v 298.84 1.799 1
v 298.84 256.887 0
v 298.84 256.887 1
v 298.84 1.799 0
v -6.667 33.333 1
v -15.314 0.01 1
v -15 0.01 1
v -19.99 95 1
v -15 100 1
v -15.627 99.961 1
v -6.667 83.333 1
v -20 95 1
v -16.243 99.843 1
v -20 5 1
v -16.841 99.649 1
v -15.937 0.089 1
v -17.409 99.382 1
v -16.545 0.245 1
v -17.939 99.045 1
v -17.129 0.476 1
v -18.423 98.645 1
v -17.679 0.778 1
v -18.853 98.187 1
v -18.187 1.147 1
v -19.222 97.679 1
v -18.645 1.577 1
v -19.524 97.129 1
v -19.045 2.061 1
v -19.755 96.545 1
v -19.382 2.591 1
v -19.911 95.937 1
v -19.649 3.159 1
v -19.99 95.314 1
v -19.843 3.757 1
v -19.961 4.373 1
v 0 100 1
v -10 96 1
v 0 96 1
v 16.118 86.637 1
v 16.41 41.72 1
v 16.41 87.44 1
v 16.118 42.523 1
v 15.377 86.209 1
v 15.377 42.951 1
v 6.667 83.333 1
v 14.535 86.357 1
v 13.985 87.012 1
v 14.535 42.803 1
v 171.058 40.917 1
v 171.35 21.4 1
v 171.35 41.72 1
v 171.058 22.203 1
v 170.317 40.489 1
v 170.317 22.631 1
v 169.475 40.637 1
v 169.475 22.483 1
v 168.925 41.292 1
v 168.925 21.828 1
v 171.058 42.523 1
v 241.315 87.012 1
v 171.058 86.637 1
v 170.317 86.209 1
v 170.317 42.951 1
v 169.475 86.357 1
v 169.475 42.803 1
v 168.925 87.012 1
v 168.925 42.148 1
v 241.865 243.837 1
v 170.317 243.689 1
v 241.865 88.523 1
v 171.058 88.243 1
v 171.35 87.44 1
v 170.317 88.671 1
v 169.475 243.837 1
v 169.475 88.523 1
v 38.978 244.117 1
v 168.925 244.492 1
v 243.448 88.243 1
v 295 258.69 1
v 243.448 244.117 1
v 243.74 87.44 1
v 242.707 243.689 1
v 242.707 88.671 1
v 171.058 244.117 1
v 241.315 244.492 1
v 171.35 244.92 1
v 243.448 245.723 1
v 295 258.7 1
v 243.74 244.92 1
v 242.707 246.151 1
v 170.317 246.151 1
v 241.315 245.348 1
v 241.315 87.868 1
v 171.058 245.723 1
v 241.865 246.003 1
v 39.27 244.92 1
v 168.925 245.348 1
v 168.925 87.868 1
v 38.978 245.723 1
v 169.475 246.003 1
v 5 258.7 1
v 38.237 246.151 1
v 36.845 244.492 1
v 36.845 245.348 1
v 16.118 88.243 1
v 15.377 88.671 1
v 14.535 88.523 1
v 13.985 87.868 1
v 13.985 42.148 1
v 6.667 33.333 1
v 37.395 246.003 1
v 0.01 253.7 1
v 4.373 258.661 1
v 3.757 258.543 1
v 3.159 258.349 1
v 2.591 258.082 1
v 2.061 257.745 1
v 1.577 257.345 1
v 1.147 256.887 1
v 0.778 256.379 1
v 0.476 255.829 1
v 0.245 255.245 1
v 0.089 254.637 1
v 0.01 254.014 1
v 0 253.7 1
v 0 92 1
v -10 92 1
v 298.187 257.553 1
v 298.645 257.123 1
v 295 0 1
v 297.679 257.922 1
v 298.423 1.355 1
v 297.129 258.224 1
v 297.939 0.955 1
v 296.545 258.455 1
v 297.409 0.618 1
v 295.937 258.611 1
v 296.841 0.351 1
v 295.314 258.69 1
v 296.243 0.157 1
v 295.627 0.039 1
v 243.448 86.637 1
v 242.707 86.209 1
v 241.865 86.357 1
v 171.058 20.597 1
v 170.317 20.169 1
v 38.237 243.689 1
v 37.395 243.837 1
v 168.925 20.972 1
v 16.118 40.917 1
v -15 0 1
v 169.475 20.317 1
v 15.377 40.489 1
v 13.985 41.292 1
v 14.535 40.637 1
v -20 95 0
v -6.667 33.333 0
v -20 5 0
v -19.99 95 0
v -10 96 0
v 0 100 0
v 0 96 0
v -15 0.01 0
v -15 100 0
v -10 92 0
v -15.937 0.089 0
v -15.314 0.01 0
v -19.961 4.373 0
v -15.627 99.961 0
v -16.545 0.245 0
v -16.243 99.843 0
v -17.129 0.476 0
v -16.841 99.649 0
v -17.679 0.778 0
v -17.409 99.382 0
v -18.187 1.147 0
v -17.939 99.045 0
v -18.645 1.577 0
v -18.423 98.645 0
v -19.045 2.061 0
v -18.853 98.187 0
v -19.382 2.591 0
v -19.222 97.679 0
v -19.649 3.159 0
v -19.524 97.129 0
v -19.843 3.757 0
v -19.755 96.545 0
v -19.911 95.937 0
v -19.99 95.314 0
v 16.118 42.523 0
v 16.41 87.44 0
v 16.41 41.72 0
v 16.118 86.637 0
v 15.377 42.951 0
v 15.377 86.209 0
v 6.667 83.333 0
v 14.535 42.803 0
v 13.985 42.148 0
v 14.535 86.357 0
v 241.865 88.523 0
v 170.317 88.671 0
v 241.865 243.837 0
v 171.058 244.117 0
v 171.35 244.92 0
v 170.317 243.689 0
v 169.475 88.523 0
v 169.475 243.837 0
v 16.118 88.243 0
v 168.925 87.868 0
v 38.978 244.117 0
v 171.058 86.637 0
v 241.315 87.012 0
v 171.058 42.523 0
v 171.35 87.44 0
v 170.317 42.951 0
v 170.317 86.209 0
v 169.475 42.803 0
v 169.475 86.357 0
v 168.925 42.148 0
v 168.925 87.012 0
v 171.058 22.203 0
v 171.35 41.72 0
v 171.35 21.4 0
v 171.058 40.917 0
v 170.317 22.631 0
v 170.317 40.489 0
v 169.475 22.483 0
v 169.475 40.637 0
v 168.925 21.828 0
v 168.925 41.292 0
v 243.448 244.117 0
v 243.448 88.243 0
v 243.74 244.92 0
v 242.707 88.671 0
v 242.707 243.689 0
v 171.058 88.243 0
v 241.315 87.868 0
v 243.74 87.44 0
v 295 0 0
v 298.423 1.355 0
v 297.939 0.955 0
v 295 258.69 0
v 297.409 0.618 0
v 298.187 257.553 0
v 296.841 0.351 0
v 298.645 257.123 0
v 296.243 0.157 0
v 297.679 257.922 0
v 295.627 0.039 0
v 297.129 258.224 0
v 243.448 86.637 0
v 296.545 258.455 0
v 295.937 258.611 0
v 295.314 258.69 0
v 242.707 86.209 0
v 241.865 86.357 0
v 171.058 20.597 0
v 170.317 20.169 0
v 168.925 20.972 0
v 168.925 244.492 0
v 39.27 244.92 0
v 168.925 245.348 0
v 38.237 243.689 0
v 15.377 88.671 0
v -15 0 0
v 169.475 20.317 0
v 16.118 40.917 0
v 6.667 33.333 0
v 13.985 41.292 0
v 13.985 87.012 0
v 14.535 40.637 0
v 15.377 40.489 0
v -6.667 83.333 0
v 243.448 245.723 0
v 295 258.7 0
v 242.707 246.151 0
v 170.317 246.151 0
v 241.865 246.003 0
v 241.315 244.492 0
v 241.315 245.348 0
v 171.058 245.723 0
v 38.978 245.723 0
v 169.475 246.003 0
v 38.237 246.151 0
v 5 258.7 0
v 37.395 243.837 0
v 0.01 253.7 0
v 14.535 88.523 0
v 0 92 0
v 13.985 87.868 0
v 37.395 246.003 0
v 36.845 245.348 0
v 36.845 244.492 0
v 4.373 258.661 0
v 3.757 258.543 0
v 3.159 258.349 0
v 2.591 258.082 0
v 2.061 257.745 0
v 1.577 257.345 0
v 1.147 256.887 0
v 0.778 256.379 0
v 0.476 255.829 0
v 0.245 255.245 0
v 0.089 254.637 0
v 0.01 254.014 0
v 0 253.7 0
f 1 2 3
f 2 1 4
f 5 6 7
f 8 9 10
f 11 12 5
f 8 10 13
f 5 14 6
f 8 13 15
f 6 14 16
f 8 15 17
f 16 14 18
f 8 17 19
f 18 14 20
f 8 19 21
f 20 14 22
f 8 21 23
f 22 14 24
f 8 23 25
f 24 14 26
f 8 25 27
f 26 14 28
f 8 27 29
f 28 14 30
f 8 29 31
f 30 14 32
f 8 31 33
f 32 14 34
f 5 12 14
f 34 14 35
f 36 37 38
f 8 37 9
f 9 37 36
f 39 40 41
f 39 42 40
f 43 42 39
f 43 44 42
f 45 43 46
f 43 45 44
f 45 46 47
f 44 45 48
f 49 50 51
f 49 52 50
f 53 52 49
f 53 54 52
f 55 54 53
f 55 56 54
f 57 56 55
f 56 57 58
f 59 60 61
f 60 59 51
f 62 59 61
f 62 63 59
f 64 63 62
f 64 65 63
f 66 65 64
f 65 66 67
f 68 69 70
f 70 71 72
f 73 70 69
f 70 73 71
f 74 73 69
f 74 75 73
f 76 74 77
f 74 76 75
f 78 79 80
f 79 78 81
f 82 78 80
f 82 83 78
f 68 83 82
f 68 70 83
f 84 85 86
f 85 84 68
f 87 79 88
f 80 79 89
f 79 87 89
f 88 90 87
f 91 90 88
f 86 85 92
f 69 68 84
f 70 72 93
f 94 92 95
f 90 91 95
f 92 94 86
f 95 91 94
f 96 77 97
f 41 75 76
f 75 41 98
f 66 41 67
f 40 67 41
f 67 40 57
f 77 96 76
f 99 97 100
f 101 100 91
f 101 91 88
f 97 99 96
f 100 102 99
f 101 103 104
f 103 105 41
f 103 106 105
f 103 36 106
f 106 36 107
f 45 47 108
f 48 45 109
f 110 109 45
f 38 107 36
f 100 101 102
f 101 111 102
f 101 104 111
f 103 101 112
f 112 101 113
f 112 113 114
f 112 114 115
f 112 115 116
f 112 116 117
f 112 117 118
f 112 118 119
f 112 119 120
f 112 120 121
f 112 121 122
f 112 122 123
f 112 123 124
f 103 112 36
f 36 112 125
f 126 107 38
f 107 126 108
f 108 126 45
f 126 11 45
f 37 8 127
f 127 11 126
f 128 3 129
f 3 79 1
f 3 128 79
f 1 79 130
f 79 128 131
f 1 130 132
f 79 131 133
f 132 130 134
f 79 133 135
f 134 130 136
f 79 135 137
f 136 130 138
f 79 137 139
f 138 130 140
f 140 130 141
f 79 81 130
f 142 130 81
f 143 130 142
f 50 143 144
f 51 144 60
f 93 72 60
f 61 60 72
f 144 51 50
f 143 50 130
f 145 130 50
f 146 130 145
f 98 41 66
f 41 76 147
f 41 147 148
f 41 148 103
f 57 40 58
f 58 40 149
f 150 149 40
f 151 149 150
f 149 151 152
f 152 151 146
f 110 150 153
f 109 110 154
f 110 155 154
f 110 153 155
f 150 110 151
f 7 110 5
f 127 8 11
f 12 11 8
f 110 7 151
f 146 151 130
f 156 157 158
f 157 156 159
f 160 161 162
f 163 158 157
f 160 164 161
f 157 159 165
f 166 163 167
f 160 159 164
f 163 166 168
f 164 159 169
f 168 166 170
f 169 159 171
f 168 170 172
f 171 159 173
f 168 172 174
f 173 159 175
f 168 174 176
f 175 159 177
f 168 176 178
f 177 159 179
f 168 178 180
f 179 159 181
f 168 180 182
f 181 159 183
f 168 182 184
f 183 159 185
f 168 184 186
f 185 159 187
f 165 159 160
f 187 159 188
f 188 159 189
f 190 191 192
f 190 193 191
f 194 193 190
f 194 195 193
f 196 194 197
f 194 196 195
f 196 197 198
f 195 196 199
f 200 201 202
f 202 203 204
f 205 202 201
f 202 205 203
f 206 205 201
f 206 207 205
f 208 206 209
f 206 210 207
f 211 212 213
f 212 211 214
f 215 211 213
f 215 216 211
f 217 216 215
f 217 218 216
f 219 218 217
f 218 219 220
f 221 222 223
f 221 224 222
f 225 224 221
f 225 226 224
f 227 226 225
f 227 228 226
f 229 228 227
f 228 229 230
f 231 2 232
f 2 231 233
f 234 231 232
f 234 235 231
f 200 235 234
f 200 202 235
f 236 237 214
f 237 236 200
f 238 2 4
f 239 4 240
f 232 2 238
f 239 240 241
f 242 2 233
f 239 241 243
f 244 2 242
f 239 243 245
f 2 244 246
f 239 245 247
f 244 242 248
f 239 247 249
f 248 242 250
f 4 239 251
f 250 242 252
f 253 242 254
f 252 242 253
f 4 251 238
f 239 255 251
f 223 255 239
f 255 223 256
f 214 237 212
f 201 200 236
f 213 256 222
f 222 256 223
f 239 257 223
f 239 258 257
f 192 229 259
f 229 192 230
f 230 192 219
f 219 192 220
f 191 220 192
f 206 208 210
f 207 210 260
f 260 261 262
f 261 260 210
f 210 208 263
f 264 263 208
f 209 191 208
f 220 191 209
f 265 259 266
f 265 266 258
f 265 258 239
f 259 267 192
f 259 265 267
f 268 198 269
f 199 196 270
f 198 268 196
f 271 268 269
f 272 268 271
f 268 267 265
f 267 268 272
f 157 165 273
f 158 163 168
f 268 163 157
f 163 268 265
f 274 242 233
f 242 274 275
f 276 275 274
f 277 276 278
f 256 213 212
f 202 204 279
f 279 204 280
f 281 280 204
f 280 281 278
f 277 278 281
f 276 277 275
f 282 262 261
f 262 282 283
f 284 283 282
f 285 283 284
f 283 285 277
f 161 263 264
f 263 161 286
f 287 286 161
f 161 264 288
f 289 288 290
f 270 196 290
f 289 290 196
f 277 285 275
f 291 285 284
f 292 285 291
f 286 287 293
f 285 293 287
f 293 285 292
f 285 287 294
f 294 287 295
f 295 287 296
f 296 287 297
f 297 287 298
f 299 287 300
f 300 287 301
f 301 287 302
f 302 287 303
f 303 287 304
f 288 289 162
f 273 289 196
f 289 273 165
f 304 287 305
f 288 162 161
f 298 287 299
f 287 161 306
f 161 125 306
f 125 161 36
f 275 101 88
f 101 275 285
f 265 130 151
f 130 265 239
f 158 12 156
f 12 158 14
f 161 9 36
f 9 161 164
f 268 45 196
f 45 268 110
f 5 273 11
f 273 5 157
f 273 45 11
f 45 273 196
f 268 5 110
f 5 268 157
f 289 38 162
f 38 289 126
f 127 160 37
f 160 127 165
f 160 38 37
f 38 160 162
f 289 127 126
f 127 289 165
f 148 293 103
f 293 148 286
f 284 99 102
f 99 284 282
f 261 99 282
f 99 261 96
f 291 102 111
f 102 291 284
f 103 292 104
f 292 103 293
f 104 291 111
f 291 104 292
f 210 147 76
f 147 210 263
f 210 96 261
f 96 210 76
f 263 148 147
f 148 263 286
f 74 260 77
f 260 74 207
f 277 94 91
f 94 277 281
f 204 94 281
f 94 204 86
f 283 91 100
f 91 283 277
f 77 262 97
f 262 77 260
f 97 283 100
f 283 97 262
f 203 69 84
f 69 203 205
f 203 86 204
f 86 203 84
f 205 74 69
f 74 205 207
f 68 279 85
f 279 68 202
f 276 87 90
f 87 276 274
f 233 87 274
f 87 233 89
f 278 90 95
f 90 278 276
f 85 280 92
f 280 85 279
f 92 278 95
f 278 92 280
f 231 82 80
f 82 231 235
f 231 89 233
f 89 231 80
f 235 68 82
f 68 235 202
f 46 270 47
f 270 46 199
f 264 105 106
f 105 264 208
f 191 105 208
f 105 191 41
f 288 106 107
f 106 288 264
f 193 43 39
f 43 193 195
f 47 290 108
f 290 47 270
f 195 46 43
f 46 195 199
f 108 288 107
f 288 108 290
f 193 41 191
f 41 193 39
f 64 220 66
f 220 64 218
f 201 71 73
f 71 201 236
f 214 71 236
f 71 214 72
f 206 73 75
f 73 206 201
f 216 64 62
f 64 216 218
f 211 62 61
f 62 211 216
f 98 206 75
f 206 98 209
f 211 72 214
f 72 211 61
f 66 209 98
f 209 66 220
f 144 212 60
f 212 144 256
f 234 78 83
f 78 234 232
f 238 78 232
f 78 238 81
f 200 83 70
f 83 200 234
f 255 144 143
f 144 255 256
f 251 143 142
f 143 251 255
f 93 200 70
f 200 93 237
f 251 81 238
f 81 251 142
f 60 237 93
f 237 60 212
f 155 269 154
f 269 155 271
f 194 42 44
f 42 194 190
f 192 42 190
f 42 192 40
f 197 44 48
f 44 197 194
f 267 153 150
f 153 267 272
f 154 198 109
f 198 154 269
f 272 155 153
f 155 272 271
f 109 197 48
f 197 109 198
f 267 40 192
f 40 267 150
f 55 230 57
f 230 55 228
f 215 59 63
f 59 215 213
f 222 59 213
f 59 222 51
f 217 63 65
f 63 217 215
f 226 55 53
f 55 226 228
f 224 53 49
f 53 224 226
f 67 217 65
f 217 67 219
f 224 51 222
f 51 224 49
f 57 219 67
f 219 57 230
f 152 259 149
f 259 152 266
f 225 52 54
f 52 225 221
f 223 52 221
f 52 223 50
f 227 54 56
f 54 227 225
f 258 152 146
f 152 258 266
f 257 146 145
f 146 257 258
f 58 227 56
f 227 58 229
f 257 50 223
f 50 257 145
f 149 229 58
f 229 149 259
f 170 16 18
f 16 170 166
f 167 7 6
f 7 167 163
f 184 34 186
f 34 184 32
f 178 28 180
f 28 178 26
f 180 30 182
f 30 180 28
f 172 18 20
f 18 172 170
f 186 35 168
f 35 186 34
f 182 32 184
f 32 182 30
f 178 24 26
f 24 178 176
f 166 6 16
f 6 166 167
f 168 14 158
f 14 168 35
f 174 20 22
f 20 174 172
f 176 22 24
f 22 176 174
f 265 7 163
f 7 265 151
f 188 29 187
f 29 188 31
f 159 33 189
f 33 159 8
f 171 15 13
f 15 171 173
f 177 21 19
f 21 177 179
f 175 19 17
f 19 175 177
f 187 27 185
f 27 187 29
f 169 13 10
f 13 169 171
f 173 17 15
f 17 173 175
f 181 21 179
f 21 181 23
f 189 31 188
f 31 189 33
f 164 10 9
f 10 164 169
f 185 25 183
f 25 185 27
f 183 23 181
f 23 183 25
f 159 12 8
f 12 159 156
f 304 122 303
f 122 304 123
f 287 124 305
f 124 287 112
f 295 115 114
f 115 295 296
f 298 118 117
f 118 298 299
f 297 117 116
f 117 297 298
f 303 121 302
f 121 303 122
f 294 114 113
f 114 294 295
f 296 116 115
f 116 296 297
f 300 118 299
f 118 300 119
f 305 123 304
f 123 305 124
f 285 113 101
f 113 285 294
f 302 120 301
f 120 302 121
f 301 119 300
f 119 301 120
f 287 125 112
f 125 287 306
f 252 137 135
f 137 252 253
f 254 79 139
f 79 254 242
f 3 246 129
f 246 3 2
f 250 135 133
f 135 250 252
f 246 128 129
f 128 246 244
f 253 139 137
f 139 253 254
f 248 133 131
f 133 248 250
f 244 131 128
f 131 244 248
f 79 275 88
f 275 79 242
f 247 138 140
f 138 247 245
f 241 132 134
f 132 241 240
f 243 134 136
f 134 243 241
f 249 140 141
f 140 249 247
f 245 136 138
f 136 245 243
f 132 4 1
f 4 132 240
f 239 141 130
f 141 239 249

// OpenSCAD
$fn = 9;
fn_corner = 50;

/*
   Rack
 */
r_unit 		= 44.45;
r_unit_nb	= 6;
r_spacer	= 4*2;	/* 2*4 mm spacer (up/down) */
r_d		= r_unit * r_unit_nb;
r_w		= 440;  /* Rack tray internal width */
r_depth		= 300;	/* Rack tray depth if it has a blocker */

/*
   Micro ATX
 */
b_w		= 243.84; /* x */
b_d		= 243.84; /* y */
b_h		= 45;     /* subjective height of the board - depends on fan/cards */
b_hole_dia 	= 2.5;

/*
   Flex PSU
 */
f_w		= 200;	  /* x */
f_d		= 81.5;	  /* y */
f_h		= 40.5;	  /* z */

/*
   Disk 2.5 3.5
   */
d_w1		= 200;	  /* x */
d_d1		= 101.6;  /* y */
d_w2		= 100;	  /* x */
d_d2		= 69.85;  /* y */

/*
   Plate
 */
p_d		= r_d - r_spacer;
p_front_b_decal	= 5;	/* 5 mm */
p_w		= p_front_b_decal + b_w + f_w + 50;	/* 5cm */
p_w_mb  = p_front_b_decal + b_w + 50;	/* 5cm */
p_thickness	= 1;
p_slot_w	= r_depth;
p_slot_d	= 10;
p_holder_w	= 20;
p_holder_d	= 100;
p_f_nb		= 5;  /* flex hole number */
p_d_nb		= 5;  /* disk hole number */
p_itemhole_w	= 10; /* flex/disk hole w */
p_itemhole_d	= 4;  /* flex/disk hole d */

/*
   Support
 */
s_h		= 7;	/* total 8mm */
s_thickness	= 1;	/* 2mm base thickness */
s_w		= r_depth/3;
s_d		= r_w / 3;


b_holes = [ /* top->bottom, left->right */
	[  33.02,	237.49 ],
	[ 165.10,	237.49 ],
	[ 237.49,	237.49 ],
	[  10.16,	 80.01 ],
	[ 165.10,        80.01 ],
	[ 237.49,	 80.01 ],
	[  10.16,	 34.29 ],
	[ 165.10,	 34.29 ],
	[ 165.10,	 13.97 ]
];

module board() {
	cube([b_w, b_d, b_h]);
}

module board_mask( spacer ) {
	board();
	for (h = b_holes)
	{
		translate([h[0],h[1],0])
			cylinder( r=b_hole_dia/2, h = spacer, center=true );
	}
}

module slot_mask(w, nb) {
	for (i = [0 : nb-1])
		translate([ w/(nb*2) + (w*i)/nb - p_itemhole_w/2, p_itemhole_d/-2,-p_thickness])
			cube([ p_itemhole_w, p_itemhole_d, p_thickness * 3 ]);
}
module psu_slots_mask() {
	slot_mask(f_w, p_f_nb);
	translate([0,f_d,0])
		slot_mask(f_w, p_f_nb);
}
module disk_slots_mask() {
	slot_mask(d_w1, p_d_nb);
	translate([0,d_d1,0])
		slot_mask(d_w1, p_d_nb);
	translate([0,d_d2,0])
		slot_mask(d_w1, p_d_nb);
}

module plate() {
	difference() {
		translate([ + p_front_b_decal, (p_d - b_d) / 2, 0 ])
		{
			difference()
			{
//				minkowski()
				{
					translate([ - p_front_b_decal, (p_d - b_d) / -2, 0 ]) {
						difference() {
							difference() {
								union() {
									cube([ p_w , p_d, p_thickness ]);
									translate([ -p_holder_w, 0, 0 ]) {
										cube([ p_holder_w, p_holder_d, p_thickness ]);
									}
								}
								translate([ -p_holder_w/3, p_holder_d/3, -p_thickness/2])
									cube([ p_holder_w*2/3, p_holder_d*1/2, p_thickness*2 ]);
								translate([ -p_itemhole_w, p_holder_d - p_itemhole_d*2, -p_thickness/2])
									cube([ p_itemhole_w, p_itemhole_d, p_thickness*2 ]);
							}
							/* Slots */
							translate([p_slot_w, 0, -p_thickness])
								cube([ p_slot_w, p_slot_d, p_thickness*3 ]);
							translate([p_slot_w, p_d - p_slot_d, -p_thickness])
								cube([ p_slot_w, p_slot_d, p_thickness*3 ]);
						}
					}
//					cylinder( r=0.1, h=0.0000001 );
				}
				translate([ 0, 0, p_thickness+0.001 ]) board_mask(p_thickness*4);
			}
		}
		/* PSU slots */
		translate( [p_w - f_w, p_d - p_slot_d - f_d - 20] )
			psu_slots_mask();
		/* Disk slots */
		translate( [p_w - d_w1, p_slot_d + 20] )
			disk_slots_mask();
	}
}

module platemb() {
	difference() {
		translate([ + p_front_b_decal, (p_d - b_d) / 2, 0 ])
		{
			difference()
			{
//				minkowski()
				{
					translate([ - p_front_b_decal, (p_d - b_d) / -2, 0 ]) {
						difference() {
							difference() {
								union() {
									cube([ p_w_mb , p_d, p_thickness ]);
									translate([ -p_holder_w, 0, 0 ]) {
										cube([ p_holder_w, p_holder_d, p_thickness ]);
									}
								}
								translate([ -p_holder_w/3, p_holder_d/3, -p_thickness/2])
									cube([ p_holder_w*2/3, p_holder_d*1/2, p_thickness*2 ]);
								translate([ -p_itemhole_w, p_holder_d - p_itemhole_d*2, -p_thickness/2])
									cube([ p_itemhole_w, p_itemhole_d, p_thickness*2 ]);
							}
						}
					}
//					cylinder( r=0.1, h=0.0000001 );
				}
				translate([ 0, 0, p_thickness+0.001 ]) board_mask(p_thickness*4);
			}
		}
	}
}



module round(o) {
	r = 5;
	rotate([0,0,o])
	translate([r,r,0]) {
		difference() {
			cube([r*2,r*2,p_thickness*4],center=true);
			cylinder(r=r, h=p_thickness*10, center=true, $fn=fn_corner);
			translate([0,-r*4,-p_thickness*4]) cube([r*8,r*8,p_thickness*8]);
			translate([-r*4,0,-p_thickness*4]) cube([r*8,r*8,p_thickness*8]);
		}
	}
}
module round_mask() {
	translate([-p_holder_w,0,0]) round(0);	/* bottom left */
	translate([-p_holder_w,p_holder_d,0]) round(-90);	/* bottom left */
	translate([0,p_d,0]) round(-90);	/* top left */
	translate([p_slot_w,p_d,0]) round(180);	/* top slot */
	translate([p_w,p_d-p_slot_d,0]) round(180);	/* top right */
	translate([p_slot_w,0,0]) round(90);	/* bottom slot */
	translate([p_w,p_slot_d,0]) round(90);	/* bottom right */
}

module plate_round() {
	difference(){ 
		plate();
		round_mask();
	}
}

module plate_roundmb() {
	difference(){ 
		platemb();
		round_mask();
	}
}

module support() {
	difference() {
		//cube([ s_w, s_d, s_h ]);
		cube([ 10, s_d, s_h ]);
		translate([10,-1,s_thickness+1])
			cube([ s_w+2, s_d+2, s_h ]);
		/* Slots - every 1mm */
		for (i = [0:100]) {
			translate([-1, 1 + (p_thickness*2.5+p_thickness)*i, s_thickness])
				cube([s_w+2, p_thickness+0.8, s_h]);
		}
		for (i = [0:20]) {
			translate([20+i*1.6*20,-1,0.15]) {
				translate([0,0,7.5])
					scale([1,1,0.4])
					rotate([-90,0,0])
					cylinder(r=21.3, h=s_d+100, $fn=6);
			}
		}
	}
}





/*
   Rack Simulation
 */
plate_nb		= 7;
plate_board_spacer	= 6;
module one_plate() {
	rotate([-90,0,0]) translate([0,-p_d,0]) {
		union() {
			translate([ p_front_b_decal, (p_d - b_d) / 2, p_thickness+plate_board_spacer ])
				color([0,0,1])
				board_mask( plate_board_spacer*2 );
			plate();
		}
	}
}
module all_plate() {
	for (i = [0:plate_nb-1])
		translate([0, (i*r_w)/(plate_nb),0])
			one_plate();
}
module shelf() {
	cube([ 60, r_w, 1 ]);
	translate([0,0,r_d])
		cube([ 60, r_w, 1 ]);
	translate([0,0,r_spacer/2 +1])
		all_plate();
}

//all_plate();
//shelf();
/* For 2d projection - dxf export */
//projection(cut = false) plate_round();

//plate_round();

plate_roundmb();

//support();
